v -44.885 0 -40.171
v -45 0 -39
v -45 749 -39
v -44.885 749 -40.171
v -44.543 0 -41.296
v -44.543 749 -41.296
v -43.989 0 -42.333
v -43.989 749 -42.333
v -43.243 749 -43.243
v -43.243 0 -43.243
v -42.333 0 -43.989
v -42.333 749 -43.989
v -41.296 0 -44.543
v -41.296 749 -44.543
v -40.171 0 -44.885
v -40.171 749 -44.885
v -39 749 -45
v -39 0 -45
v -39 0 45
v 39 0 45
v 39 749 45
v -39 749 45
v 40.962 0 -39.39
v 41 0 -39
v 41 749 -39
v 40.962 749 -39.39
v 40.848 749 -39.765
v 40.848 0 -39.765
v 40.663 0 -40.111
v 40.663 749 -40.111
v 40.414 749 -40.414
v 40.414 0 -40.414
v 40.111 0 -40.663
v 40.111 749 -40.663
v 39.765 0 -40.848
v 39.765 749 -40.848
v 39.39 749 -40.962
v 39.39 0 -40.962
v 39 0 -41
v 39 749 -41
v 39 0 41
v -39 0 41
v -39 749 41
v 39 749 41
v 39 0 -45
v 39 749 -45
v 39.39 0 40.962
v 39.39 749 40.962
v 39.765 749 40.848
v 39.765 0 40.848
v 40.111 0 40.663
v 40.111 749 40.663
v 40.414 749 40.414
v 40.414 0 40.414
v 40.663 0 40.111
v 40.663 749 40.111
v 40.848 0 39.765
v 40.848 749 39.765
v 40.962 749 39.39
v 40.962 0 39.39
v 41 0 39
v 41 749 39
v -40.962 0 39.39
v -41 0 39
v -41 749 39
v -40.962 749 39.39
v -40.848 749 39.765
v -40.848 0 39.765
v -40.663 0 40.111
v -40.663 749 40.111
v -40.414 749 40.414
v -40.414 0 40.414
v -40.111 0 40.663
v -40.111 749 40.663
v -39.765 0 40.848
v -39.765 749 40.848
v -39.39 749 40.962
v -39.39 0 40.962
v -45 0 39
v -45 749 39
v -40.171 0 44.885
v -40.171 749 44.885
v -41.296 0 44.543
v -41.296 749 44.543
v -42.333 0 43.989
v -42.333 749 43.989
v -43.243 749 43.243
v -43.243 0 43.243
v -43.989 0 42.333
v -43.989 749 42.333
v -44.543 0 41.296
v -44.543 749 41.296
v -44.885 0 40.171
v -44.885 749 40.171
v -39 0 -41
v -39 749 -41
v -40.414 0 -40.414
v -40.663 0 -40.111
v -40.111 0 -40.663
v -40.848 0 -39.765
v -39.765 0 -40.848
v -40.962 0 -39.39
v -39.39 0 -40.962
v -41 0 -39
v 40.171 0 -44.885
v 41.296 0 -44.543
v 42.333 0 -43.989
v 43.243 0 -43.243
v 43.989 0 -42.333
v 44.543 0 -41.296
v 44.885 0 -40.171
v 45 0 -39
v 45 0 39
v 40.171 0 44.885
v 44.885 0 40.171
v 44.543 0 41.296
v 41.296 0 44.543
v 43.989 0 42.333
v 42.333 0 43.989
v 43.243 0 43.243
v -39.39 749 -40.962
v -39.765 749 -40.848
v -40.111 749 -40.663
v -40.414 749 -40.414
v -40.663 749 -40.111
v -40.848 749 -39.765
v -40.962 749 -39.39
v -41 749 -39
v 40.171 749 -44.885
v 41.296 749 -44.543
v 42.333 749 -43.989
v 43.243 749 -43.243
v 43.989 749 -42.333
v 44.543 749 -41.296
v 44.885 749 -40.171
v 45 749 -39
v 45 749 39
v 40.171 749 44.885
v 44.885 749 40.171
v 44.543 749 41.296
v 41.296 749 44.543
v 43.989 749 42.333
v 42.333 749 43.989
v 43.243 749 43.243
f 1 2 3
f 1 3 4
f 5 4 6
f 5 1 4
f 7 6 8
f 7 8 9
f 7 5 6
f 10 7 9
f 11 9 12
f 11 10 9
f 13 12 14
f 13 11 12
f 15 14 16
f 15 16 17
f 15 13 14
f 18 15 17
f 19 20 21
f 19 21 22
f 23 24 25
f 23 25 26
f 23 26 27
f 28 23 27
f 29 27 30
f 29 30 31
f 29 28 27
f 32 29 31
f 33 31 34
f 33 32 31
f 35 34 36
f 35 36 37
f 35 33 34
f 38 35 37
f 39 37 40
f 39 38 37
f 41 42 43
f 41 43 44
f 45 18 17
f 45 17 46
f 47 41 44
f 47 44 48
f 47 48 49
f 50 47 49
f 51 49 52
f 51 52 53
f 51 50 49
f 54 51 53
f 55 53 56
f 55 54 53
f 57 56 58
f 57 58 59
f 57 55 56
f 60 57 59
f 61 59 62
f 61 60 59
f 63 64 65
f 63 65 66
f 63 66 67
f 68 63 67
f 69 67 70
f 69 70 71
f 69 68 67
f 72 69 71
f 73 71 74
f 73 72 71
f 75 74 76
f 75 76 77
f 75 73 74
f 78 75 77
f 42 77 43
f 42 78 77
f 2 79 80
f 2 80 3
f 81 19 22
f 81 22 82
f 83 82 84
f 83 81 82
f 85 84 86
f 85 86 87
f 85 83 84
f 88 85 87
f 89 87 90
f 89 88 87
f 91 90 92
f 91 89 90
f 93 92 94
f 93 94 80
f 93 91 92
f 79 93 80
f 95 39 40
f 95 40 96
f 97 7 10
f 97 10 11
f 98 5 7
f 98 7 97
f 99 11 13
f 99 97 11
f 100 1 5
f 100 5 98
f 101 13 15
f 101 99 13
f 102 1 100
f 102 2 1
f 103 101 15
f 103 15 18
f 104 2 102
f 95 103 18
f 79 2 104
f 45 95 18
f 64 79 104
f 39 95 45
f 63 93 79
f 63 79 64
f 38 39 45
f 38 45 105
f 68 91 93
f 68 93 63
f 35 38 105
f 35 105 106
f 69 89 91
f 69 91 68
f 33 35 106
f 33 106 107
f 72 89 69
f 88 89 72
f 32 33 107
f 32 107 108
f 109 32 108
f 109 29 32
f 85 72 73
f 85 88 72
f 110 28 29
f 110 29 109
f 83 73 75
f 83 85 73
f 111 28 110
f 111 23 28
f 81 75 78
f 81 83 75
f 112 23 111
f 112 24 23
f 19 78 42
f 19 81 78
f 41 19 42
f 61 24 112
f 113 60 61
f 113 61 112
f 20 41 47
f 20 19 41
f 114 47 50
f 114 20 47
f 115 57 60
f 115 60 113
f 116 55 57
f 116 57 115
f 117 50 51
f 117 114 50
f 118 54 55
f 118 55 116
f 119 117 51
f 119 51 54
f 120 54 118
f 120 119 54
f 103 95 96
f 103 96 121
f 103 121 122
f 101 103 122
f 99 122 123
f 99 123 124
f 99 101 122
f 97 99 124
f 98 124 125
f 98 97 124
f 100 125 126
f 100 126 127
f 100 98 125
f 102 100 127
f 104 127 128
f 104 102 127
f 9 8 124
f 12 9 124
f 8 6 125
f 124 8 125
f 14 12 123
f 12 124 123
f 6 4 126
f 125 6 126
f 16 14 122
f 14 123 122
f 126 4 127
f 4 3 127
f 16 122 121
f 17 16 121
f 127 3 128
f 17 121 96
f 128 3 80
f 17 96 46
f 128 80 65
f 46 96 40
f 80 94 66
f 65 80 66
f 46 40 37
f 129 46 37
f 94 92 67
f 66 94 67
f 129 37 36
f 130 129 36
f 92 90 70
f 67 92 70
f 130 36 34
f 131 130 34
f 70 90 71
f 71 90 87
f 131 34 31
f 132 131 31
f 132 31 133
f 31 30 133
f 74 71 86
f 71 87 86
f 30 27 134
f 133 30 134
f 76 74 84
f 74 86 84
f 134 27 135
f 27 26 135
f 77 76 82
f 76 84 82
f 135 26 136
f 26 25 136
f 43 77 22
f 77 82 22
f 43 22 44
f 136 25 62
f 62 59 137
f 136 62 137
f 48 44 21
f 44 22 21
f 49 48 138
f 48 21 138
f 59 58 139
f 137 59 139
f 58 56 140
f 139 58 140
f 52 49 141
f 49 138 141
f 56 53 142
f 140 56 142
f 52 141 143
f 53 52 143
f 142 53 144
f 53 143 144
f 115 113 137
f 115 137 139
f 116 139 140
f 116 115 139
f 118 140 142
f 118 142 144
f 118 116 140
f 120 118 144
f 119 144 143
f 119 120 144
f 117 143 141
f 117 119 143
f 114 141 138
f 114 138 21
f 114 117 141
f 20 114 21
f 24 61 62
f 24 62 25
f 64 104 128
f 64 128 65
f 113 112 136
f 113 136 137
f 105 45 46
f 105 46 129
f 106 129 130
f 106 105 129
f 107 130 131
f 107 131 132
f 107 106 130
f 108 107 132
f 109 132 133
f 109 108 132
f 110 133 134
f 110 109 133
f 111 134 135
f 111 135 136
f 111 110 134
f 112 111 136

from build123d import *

# Parameters (mm, degrees)
F1_DEPTH = 749


with BuildPart() as f1:
    # F0 (on Front) → F1 (new body)
    with BuildSketch(Plane.XZ):
        with BuildLine():
            ThreePointArc((45, 39), (43.242641, 43.242641), (39, 45))
            Line((39, 45), (-39, 45))
            ThreePointArc((-39, 45), (-43.242641, 43.242641), (-45, 39))
            Line((-45, 39), (-45, -39))
            ThreePointArc((-45, -39), (-43.242641, -43.242641), (-39, -45))
            Line((-39, -45), (39, -45))
            ThreePointArc((39, -45), (43.242641, -43.242641), (45, -39))
            Line((45, -39), (45, 39))
        make_face()
        with BuildLine():
            ThreePointArc((-41, 39), (-40.414214, 40.414214), (-39, 41))
            Line((-39, 41), (39, 41))
            ThreePointArc((39, 41), (40.414214, 40.414214), (41, 39))
            Line((41, 39), (41, -39))
            ThreePointArc((41, -39), (40.414214, -40.414214), (39, -41))
            Line((39, -41), (-39, -41))
            ThreePointArc((-39, -41), (-40.414214, -40.414214), (-41, -39))
            Line((-41, -39), (-41, 39))
        make_face(mode=Mode.SUBTRACT)
    extrude(amount=-F1_DEPTH)


solid = f1.part
